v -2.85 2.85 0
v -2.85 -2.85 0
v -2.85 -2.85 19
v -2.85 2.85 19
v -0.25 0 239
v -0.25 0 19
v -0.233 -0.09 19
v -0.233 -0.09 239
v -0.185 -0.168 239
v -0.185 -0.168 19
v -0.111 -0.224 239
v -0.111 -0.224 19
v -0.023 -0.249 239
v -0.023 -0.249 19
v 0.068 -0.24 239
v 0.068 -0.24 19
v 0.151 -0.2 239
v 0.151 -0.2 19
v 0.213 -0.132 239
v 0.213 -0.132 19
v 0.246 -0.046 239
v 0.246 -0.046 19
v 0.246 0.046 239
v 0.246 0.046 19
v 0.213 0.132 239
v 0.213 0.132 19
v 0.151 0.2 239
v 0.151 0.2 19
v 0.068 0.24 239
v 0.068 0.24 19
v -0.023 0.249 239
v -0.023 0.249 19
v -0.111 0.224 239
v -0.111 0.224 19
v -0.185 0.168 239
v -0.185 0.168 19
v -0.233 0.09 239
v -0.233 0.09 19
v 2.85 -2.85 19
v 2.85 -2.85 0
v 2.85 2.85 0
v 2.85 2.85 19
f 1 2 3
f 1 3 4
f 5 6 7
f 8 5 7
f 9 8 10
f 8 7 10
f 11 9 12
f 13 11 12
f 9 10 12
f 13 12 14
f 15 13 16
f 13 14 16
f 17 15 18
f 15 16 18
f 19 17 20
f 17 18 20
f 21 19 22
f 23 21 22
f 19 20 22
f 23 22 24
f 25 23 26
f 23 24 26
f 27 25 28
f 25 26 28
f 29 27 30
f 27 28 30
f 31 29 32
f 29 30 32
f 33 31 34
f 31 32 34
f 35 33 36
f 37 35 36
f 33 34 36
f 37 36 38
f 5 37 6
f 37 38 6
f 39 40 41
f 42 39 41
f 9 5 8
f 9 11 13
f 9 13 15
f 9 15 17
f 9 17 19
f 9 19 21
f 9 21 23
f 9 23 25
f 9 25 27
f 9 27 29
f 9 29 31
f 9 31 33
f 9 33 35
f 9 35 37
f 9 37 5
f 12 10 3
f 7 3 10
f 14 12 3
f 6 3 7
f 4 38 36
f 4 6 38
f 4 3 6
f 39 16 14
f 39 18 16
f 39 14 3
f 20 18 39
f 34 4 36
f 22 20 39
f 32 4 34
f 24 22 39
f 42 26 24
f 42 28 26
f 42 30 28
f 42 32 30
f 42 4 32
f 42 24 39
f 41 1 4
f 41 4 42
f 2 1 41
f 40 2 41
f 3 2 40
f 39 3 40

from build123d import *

# Parameters (mm, degrees)
ESBO_O1_W                = 5.7
ESBO_O1_H                = 5.7
RESSALTO_EXTRUS_O1_DEPTH = 19
ESBO_O2_R                = 0.25
RESSALTO_EXTRUS_O2_DEPTH = 220


with BuildPart() as part:
    # Esboço1 → Ressalto-extrusão1 (new body)
    with BuildSketch(Plane.XY):
        Rectangle(ESBO_O1_W, ESBO_O1_H)
    extrude(amount=RESSALTO_EXTRUS_O1_DEPTH)

    # Esboço2 → Ressalto-extrusão2 (add)
    with BuildSketch(Plane.XY.offset(19)):
        with Locations(Location((0, 0, 0), (0, 0, 180))):
            Circle(ESBO_O2_R)
    extrude(amount=RESSALTO_EXTRUS_O2_DEPTH)


solid = part.part
